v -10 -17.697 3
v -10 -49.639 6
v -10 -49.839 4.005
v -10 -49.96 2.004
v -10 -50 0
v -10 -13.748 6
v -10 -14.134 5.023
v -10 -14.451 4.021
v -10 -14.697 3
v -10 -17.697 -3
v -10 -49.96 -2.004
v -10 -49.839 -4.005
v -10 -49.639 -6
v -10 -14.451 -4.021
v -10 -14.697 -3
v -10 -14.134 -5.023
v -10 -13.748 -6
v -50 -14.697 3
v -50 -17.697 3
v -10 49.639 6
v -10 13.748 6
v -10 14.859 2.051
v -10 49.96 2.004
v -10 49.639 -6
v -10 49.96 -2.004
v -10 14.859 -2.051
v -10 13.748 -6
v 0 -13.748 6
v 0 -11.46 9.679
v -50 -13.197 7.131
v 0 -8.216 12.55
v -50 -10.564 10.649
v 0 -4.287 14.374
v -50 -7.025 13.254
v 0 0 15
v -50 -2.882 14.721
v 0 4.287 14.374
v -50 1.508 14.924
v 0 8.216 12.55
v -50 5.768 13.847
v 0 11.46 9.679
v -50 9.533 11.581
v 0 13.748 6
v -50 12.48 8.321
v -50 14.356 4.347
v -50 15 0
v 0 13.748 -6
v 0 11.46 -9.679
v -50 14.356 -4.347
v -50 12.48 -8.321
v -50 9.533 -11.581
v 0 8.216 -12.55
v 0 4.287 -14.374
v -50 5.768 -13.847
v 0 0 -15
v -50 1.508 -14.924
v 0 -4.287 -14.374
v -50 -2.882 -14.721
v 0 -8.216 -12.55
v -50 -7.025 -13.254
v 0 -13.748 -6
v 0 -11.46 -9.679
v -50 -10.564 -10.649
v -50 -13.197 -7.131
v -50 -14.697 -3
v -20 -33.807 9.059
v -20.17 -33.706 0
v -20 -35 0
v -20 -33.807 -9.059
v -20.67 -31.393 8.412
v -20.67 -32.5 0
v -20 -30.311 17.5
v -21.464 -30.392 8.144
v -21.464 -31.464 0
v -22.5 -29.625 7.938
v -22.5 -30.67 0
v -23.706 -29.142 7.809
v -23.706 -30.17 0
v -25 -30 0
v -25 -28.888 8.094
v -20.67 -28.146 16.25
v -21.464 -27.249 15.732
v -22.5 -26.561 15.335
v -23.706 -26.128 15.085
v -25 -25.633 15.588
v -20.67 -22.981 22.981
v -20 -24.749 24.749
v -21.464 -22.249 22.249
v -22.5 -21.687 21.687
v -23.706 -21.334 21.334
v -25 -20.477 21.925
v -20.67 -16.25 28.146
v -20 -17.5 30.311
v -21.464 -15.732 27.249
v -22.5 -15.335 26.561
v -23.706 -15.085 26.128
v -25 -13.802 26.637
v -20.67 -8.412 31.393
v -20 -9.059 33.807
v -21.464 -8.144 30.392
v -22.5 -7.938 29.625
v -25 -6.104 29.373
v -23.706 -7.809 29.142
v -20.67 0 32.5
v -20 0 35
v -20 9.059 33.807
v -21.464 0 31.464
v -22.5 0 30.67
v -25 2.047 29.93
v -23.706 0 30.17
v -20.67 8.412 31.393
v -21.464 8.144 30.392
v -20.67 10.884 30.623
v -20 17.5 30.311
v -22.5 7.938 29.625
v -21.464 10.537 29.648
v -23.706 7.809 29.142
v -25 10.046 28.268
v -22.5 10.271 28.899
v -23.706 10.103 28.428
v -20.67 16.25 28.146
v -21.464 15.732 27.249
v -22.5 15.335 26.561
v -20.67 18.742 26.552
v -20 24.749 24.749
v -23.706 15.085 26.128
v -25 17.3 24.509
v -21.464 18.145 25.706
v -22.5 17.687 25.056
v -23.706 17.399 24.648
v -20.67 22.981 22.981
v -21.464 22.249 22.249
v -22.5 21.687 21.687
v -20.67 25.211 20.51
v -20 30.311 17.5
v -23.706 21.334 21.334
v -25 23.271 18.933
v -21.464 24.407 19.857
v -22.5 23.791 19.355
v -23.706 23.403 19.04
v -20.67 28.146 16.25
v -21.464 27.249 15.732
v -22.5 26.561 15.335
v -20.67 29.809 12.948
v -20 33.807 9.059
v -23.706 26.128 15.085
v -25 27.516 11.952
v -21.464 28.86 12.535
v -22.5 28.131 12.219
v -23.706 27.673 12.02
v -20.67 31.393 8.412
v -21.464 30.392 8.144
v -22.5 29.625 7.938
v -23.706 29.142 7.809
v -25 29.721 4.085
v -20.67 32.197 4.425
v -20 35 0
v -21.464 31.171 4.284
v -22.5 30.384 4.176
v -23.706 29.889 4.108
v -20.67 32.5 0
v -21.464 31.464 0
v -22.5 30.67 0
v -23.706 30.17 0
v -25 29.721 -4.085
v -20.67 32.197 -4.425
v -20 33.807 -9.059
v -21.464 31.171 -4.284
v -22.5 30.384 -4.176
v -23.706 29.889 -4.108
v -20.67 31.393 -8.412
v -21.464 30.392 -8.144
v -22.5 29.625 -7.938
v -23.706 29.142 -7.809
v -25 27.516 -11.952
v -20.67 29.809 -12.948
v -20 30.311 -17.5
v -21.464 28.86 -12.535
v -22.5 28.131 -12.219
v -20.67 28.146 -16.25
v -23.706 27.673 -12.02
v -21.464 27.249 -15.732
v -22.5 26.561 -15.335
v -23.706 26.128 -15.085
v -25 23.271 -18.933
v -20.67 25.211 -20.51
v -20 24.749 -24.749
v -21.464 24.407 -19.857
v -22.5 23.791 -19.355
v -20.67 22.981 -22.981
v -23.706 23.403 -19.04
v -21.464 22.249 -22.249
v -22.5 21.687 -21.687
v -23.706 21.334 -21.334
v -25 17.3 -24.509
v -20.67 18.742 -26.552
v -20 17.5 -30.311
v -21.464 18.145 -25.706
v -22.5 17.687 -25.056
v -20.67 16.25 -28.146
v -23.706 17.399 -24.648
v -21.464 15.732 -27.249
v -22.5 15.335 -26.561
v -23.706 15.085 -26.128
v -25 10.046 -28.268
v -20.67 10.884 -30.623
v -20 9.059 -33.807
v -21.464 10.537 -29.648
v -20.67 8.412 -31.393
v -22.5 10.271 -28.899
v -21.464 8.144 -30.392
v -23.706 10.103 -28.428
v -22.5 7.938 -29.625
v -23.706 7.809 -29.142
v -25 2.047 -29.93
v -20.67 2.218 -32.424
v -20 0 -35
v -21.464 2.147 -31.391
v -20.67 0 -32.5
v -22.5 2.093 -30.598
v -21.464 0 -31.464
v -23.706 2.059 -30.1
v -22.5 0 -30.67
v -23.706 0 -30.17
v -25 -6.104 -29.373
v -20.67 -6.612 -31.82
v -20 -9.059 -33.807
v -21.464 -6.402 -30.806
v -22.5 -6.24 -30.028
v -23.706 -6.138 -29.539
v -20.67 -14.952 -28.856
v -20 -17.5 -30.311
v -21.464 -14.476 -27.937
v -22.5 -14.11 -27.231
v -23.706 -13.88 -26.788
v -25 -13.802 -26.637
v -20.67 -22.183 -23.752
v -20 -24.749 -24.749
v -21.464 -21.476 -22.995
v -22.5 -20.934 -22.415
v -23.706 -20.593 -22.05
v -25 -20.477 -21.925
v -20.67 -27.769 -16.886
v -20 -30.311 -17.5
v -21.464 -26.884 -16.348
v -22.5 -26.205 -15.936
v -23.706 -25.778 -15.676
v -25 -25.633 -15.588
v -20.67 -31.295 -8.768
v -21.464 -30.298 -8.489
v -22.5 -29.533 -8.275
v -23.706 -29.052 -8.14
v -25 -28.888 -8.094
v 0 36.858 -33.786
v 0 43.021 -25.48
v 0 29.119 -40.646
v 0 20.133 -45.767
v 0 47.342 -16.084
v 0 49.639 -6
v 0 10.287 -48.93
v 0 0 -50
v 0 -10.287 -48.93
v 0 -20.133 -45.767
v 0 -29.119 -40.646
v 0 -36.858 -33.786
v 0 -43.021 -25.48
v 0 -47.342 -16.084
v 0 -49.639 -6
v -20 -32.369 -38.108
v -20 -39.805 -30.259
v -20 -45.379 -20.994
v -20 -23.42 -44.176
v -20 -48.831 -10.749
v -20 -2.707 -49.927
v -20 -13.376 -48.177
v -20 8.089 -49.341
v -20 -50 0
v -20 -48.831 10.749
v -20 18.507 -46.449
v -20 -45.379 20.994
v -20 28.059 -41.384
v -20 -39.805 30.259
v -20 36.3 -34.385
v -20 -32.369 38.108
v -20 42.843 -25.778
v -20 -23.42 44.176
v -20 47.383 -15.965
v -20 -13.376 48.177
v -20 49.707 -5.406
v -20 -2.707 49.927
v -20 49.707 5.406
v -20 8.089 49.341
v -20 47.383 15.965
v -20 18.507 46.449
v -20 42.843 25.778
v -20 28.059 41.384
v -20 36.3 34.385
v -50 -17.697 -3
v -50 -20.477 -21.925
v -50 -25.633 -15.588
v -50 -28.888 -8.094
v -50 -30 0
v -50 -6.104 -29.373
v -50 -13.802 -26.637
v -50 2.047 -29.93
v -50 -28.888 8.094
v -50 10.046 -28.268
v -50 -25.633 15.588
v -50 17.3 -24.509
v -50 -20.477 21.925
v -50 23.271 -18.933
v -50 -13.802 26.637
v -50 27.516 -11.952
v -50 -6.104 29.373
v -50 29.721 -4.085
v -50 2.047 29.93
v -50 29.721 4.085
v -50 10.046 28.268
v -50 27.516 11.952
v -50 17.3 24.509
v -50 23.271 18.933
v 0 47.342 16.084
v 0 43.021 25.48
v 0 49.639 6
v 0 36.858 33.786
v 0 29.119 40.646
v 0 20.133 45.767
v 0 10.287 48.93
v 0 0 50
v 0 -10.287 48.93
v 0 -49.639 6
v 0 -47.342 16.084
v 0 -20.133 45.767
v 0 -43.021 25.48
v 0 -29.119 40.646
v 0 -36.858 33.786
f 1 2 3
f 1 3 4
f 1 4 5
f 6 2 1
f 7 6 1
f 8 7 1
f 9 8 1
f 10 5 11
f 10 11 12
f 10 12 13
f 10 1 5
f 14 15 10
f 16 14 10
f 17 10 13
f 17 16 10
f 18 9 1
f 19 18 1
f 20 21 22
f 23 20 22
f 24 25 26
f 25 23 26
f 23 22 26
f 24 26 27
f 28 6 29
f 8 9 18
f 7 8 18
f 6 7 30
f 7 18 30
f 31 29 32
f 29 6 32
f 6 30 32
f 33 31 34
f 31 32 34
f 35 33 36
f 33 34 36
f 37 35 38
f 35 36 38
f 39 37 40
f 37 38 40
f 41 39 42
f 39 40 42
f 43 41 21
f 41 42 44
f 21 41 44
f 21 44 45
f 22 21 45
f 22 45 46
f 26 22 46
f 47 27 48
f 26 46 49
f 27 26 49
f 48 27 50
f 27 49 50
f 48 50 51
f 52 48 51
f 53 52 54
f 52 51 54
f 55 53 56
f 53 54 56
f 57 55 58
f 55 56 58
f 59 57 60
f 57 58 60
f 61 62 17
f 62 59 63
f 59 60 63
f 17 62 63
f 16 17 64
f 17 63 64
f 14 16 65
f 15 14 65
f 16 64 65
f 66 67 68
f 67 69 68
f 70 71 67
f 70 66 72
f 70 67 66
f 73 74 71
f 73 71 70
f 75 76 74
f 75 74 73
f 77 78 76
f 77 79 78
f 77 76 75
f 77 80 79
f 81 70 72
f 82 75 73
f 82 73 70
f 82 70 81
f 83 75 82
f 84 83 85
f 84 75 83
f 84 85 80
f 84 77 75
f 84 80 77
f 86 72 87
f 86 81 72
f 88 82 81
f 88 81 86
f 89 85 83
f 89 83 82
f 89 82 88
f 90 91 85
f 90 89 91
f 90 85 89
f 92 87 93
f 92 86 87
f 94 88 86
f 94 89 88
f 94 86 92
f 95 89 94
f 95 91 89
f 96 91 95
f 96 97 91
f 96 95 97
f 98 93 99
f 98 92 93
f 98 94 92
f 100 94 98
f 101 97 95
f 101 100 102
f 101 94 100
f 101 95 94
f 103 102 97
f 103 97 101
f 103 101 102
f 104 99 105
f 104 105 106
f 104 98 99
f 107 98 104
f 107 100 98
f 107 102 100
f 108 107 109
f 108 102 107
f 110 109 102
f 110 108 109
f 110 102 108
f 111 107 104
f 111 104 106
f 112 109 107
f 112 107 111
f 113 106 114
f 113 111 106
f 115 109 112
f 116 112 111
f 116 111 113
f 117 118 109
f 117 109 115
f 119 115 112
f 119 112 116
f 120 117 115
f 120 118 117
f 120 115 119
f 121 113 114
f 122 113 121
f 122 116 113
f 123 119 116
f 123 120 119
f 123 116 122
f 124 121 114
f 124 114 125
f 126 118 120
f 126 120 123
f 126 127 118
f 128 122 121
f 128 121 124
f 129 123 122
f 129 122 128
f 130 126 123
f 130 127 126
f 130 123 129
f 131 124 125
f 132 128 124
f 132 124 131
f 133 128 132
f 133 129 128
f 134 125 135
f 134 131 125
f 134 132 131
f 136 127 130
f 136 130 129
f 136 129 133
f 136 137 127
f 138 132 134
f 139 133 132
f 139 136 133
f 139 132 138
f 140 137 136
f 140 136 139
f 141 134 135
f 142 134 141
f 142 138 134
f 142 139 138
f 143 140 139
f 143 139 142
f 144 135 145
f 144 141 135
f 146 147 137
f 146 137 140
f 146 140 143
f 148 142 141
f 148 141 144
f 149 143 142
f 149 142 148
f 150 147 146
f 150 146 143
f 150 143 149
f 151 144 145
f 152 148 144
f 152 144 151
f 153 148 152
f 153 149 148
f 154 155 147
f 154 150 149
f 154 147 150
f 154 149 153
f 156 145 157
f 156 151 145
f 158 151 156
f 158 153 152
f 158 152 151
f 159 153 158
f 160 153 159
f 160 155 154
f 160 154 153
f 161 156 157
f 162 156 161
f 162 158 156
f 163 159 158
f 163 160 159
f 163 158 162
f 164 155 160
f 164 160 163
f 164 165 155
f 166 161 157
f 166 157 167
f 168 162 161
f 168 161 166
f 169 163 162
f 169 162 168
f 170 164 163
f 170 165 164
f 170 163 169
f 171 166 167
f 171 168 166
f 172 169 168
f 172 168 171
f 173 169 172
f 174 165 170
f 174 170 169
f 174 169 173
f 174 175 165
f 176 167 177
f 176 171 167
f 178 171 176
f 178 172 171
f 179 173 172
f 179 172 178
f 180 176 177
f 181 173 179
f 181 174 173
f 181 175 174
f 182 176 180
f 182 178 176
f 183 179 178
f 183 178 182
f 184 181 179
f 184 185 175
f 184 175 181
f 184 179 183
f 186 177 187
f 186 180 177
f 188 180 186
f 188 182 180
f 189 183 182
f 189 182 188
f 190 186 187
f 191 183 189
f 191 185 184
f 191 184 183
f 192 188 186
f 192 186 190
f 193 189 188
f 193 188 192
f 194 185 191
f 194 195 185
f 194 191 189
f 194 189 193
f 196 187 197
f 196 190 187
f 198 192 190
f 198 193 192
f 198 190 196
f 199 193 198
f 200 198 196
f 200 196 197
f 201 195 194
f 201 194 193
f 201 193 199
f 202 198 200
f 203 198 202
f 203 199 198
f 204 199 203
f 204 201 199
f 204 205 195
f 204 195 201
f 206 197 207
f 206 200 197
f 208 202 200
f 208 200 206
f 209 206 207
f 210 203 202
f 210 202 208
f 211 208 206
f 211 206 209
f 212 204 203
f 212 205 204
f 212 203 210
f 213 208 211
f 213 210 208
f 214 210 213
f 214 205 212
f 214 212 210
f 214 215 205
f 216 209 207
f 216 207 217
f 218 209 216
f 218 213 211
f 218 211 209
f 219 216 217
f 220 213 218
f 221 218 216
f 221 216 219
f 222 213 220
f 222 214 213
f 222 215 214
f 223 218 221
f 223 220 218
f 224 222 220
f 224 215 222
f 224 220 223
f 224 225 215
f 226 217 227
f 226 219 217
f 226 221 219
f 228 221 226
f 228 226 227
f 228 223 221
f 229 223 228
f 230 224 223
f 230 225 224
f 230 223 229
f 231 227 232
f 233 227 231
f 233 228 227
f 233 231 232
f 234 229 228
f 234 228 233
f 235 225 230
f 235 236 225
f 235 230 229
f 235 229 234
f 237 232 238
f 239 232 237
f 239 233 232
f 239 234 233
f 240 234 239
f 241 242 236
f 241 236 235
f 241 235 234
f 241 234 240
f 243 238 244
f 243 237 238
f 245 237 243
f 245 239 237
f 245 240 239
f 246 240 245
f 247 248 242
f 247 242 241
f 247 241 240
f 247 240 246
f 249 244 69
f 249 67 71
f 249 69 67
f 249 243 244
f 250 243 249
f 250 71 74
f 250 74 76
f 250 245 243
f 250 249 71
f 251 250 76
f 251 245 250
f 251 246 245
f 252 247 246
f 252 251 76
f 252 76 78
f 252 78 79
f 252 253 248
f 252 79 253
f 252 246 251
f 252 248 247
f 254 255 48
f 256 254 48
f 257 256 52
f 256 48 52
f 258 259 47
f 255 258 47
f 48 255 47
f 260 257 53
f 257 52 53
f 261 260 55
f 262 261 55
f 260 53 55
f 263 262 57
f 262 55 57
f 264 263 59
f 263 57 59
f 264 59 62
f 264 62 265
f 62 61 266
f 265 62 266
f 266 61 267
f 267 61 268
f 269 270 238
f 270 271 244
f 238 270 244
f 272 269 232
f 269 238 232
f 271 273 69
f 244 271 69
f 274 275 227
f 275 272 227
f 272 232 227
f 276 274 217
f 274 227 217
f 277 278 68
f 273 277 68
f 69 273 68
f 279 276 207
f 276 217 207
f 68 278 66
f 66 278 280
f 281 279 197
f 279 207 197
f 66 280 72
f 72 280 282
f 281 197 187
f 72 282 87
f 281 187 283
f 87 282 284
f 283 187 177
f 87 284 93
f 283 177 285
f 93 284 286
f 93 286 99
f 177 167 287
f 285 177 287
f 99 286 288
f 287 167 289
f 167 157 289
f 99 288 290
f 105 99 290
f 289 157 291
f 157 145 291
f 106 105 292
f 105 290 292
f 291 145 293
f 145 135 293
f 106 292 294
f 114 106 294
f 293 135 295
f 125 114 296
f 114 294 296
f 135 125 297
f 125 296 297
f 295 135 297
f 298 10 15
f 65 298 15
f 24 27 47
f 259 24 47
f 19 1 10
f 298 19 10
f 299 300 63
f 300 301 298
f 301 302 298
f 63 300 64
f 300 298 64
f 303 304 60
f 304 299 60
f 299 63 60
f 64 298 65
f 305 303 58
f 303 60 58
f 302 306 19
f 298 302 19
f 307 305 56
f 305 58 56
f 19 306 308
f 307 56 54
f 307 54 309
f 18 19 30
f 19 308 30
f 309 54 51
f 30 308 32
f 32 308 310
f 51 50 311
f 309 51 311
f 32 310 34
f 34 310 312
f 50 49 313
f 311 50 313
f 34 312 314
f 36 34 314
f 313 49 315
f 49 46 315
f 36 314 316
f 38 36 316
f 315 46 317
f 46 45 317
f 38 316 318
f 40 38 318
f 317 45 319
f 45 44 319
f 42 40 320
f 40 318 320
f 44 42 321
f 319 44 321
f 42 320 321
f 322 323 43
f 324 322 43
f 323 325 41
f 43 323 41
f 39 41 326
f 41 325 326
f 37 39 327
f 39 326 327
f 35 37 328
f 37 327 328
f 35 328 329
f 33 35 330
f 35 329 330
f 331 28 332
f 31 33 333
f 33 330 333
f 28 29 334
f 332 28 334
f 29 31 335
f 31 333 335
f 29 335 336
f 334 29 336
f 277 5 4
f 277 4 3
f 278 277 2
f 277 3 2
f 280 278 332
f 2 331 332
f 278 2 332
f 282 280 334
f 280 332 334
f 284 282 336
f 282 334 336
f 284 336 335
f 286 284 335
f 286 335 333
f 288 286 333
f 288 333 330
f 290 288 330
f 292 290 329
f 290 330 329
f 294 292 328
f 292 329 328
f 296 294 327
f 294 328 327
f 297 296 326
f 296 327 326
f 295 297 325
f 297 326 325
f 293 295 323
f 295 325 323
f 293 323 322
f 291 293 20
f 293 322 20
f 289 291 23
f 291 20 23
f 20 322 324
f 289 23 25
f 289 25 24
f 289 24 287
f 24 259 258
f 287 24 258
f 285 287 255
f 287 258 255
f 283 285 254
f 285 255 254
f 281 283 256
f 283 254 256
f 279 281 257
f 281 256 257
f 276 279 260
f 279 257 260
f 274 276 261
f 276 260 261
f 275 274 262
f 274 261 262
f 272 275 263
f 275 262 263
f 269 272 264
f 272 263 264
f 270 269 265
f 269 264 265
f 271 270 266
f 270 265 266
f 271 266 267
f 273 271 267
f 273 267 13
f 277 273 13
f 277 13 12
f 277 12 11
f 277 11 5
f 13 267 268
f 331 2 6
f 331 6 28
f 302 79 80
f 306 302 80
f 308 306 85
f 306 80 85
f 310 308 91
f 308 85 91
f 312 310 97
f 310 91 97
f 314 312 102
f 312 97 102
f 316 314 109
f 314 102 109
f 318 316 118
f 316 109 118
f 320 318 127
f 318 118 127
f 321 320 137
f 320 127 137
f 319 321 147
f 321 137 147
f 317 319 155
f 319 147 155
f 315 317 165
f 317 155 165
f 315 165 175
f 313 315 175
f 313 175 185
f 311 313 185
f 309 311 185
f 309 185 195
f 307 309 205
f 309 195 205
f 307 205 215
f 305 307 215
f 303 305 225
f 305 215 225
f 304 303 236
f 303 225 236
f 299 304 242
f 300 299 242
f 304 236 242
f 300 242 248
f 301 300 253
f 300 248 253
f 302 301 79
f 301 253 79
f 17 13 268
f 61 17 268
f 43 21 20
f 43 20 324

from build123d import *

# Parameters (mm, degrees)
F1_W          = 10
F1_H          = 6
F3_DEPTH      = 100
F3_DEPTH_BACK = 100
F5_DEPTH      = 100
F6_R          = 5


with BuildPart() as f2:
    # F0 (on Top) → F2 (revolve)
    with BuildSketch(Plane.XY):
        Polygon((0, -50), (0, -15), (-50, -15), (-50, -30), (-20, -30), (-20, -50), align=None)
    revolve(axis=Axis((-24.532024, 0, 0), (-1, 0, 0)))

    # F1 (on Front) → F3 (cut, two sides)
    with BuildSketch(Plane.XZ) as f3_sk:
        with Locations((-5, 3)):
            Rectangle(F1_W, F1_H)
        with Locations((-5, -3)):
            Rectangle(F1_W, F1_H)
    extrude(amount=F3_DEPTH, mode=Mode.SUBTRACT)
    extrude(f3_sk.sketch, amount=-F3_DEPTH_BACK, mode=Mode.SUBTRACT)

    # F4 (on Right) → F5 (cut)
    with BuildSketch(Plane.YZ):
        with BuildLine():
            ThreePointArc((-15, 0), (-14.924042, 1.507634), (-14.696938, 3))
            Line((-14.696938, 3), (-17.696938, 3))
            Line((-17.696938, 3), (-17.696938, 0))
            Line((-17.696938, 0), (-15, 0))
        make_face()
        with BuildLine():
            Line((-17.696938, -3), (-14.696938, -3))
            ThreePointArc((-14.696938, -3), (-14.924042, -1.507634), (-15, 0))
            Line((-15, 0), (-17.696938, 0))
            Line((-17.696938, 0), (-17.696938, -3))
        make_face()
    extrude(amount=-F5_DEPTH, mode=Mode.SUBTRACT)

    # F6
    f6_edges = [f2.edges().sort_by_distance(p)[0] for p in [
        (-20, 30, 0),
    ]]
    fillet(f6_edges, radius=F6_R)


solid = f2.part
